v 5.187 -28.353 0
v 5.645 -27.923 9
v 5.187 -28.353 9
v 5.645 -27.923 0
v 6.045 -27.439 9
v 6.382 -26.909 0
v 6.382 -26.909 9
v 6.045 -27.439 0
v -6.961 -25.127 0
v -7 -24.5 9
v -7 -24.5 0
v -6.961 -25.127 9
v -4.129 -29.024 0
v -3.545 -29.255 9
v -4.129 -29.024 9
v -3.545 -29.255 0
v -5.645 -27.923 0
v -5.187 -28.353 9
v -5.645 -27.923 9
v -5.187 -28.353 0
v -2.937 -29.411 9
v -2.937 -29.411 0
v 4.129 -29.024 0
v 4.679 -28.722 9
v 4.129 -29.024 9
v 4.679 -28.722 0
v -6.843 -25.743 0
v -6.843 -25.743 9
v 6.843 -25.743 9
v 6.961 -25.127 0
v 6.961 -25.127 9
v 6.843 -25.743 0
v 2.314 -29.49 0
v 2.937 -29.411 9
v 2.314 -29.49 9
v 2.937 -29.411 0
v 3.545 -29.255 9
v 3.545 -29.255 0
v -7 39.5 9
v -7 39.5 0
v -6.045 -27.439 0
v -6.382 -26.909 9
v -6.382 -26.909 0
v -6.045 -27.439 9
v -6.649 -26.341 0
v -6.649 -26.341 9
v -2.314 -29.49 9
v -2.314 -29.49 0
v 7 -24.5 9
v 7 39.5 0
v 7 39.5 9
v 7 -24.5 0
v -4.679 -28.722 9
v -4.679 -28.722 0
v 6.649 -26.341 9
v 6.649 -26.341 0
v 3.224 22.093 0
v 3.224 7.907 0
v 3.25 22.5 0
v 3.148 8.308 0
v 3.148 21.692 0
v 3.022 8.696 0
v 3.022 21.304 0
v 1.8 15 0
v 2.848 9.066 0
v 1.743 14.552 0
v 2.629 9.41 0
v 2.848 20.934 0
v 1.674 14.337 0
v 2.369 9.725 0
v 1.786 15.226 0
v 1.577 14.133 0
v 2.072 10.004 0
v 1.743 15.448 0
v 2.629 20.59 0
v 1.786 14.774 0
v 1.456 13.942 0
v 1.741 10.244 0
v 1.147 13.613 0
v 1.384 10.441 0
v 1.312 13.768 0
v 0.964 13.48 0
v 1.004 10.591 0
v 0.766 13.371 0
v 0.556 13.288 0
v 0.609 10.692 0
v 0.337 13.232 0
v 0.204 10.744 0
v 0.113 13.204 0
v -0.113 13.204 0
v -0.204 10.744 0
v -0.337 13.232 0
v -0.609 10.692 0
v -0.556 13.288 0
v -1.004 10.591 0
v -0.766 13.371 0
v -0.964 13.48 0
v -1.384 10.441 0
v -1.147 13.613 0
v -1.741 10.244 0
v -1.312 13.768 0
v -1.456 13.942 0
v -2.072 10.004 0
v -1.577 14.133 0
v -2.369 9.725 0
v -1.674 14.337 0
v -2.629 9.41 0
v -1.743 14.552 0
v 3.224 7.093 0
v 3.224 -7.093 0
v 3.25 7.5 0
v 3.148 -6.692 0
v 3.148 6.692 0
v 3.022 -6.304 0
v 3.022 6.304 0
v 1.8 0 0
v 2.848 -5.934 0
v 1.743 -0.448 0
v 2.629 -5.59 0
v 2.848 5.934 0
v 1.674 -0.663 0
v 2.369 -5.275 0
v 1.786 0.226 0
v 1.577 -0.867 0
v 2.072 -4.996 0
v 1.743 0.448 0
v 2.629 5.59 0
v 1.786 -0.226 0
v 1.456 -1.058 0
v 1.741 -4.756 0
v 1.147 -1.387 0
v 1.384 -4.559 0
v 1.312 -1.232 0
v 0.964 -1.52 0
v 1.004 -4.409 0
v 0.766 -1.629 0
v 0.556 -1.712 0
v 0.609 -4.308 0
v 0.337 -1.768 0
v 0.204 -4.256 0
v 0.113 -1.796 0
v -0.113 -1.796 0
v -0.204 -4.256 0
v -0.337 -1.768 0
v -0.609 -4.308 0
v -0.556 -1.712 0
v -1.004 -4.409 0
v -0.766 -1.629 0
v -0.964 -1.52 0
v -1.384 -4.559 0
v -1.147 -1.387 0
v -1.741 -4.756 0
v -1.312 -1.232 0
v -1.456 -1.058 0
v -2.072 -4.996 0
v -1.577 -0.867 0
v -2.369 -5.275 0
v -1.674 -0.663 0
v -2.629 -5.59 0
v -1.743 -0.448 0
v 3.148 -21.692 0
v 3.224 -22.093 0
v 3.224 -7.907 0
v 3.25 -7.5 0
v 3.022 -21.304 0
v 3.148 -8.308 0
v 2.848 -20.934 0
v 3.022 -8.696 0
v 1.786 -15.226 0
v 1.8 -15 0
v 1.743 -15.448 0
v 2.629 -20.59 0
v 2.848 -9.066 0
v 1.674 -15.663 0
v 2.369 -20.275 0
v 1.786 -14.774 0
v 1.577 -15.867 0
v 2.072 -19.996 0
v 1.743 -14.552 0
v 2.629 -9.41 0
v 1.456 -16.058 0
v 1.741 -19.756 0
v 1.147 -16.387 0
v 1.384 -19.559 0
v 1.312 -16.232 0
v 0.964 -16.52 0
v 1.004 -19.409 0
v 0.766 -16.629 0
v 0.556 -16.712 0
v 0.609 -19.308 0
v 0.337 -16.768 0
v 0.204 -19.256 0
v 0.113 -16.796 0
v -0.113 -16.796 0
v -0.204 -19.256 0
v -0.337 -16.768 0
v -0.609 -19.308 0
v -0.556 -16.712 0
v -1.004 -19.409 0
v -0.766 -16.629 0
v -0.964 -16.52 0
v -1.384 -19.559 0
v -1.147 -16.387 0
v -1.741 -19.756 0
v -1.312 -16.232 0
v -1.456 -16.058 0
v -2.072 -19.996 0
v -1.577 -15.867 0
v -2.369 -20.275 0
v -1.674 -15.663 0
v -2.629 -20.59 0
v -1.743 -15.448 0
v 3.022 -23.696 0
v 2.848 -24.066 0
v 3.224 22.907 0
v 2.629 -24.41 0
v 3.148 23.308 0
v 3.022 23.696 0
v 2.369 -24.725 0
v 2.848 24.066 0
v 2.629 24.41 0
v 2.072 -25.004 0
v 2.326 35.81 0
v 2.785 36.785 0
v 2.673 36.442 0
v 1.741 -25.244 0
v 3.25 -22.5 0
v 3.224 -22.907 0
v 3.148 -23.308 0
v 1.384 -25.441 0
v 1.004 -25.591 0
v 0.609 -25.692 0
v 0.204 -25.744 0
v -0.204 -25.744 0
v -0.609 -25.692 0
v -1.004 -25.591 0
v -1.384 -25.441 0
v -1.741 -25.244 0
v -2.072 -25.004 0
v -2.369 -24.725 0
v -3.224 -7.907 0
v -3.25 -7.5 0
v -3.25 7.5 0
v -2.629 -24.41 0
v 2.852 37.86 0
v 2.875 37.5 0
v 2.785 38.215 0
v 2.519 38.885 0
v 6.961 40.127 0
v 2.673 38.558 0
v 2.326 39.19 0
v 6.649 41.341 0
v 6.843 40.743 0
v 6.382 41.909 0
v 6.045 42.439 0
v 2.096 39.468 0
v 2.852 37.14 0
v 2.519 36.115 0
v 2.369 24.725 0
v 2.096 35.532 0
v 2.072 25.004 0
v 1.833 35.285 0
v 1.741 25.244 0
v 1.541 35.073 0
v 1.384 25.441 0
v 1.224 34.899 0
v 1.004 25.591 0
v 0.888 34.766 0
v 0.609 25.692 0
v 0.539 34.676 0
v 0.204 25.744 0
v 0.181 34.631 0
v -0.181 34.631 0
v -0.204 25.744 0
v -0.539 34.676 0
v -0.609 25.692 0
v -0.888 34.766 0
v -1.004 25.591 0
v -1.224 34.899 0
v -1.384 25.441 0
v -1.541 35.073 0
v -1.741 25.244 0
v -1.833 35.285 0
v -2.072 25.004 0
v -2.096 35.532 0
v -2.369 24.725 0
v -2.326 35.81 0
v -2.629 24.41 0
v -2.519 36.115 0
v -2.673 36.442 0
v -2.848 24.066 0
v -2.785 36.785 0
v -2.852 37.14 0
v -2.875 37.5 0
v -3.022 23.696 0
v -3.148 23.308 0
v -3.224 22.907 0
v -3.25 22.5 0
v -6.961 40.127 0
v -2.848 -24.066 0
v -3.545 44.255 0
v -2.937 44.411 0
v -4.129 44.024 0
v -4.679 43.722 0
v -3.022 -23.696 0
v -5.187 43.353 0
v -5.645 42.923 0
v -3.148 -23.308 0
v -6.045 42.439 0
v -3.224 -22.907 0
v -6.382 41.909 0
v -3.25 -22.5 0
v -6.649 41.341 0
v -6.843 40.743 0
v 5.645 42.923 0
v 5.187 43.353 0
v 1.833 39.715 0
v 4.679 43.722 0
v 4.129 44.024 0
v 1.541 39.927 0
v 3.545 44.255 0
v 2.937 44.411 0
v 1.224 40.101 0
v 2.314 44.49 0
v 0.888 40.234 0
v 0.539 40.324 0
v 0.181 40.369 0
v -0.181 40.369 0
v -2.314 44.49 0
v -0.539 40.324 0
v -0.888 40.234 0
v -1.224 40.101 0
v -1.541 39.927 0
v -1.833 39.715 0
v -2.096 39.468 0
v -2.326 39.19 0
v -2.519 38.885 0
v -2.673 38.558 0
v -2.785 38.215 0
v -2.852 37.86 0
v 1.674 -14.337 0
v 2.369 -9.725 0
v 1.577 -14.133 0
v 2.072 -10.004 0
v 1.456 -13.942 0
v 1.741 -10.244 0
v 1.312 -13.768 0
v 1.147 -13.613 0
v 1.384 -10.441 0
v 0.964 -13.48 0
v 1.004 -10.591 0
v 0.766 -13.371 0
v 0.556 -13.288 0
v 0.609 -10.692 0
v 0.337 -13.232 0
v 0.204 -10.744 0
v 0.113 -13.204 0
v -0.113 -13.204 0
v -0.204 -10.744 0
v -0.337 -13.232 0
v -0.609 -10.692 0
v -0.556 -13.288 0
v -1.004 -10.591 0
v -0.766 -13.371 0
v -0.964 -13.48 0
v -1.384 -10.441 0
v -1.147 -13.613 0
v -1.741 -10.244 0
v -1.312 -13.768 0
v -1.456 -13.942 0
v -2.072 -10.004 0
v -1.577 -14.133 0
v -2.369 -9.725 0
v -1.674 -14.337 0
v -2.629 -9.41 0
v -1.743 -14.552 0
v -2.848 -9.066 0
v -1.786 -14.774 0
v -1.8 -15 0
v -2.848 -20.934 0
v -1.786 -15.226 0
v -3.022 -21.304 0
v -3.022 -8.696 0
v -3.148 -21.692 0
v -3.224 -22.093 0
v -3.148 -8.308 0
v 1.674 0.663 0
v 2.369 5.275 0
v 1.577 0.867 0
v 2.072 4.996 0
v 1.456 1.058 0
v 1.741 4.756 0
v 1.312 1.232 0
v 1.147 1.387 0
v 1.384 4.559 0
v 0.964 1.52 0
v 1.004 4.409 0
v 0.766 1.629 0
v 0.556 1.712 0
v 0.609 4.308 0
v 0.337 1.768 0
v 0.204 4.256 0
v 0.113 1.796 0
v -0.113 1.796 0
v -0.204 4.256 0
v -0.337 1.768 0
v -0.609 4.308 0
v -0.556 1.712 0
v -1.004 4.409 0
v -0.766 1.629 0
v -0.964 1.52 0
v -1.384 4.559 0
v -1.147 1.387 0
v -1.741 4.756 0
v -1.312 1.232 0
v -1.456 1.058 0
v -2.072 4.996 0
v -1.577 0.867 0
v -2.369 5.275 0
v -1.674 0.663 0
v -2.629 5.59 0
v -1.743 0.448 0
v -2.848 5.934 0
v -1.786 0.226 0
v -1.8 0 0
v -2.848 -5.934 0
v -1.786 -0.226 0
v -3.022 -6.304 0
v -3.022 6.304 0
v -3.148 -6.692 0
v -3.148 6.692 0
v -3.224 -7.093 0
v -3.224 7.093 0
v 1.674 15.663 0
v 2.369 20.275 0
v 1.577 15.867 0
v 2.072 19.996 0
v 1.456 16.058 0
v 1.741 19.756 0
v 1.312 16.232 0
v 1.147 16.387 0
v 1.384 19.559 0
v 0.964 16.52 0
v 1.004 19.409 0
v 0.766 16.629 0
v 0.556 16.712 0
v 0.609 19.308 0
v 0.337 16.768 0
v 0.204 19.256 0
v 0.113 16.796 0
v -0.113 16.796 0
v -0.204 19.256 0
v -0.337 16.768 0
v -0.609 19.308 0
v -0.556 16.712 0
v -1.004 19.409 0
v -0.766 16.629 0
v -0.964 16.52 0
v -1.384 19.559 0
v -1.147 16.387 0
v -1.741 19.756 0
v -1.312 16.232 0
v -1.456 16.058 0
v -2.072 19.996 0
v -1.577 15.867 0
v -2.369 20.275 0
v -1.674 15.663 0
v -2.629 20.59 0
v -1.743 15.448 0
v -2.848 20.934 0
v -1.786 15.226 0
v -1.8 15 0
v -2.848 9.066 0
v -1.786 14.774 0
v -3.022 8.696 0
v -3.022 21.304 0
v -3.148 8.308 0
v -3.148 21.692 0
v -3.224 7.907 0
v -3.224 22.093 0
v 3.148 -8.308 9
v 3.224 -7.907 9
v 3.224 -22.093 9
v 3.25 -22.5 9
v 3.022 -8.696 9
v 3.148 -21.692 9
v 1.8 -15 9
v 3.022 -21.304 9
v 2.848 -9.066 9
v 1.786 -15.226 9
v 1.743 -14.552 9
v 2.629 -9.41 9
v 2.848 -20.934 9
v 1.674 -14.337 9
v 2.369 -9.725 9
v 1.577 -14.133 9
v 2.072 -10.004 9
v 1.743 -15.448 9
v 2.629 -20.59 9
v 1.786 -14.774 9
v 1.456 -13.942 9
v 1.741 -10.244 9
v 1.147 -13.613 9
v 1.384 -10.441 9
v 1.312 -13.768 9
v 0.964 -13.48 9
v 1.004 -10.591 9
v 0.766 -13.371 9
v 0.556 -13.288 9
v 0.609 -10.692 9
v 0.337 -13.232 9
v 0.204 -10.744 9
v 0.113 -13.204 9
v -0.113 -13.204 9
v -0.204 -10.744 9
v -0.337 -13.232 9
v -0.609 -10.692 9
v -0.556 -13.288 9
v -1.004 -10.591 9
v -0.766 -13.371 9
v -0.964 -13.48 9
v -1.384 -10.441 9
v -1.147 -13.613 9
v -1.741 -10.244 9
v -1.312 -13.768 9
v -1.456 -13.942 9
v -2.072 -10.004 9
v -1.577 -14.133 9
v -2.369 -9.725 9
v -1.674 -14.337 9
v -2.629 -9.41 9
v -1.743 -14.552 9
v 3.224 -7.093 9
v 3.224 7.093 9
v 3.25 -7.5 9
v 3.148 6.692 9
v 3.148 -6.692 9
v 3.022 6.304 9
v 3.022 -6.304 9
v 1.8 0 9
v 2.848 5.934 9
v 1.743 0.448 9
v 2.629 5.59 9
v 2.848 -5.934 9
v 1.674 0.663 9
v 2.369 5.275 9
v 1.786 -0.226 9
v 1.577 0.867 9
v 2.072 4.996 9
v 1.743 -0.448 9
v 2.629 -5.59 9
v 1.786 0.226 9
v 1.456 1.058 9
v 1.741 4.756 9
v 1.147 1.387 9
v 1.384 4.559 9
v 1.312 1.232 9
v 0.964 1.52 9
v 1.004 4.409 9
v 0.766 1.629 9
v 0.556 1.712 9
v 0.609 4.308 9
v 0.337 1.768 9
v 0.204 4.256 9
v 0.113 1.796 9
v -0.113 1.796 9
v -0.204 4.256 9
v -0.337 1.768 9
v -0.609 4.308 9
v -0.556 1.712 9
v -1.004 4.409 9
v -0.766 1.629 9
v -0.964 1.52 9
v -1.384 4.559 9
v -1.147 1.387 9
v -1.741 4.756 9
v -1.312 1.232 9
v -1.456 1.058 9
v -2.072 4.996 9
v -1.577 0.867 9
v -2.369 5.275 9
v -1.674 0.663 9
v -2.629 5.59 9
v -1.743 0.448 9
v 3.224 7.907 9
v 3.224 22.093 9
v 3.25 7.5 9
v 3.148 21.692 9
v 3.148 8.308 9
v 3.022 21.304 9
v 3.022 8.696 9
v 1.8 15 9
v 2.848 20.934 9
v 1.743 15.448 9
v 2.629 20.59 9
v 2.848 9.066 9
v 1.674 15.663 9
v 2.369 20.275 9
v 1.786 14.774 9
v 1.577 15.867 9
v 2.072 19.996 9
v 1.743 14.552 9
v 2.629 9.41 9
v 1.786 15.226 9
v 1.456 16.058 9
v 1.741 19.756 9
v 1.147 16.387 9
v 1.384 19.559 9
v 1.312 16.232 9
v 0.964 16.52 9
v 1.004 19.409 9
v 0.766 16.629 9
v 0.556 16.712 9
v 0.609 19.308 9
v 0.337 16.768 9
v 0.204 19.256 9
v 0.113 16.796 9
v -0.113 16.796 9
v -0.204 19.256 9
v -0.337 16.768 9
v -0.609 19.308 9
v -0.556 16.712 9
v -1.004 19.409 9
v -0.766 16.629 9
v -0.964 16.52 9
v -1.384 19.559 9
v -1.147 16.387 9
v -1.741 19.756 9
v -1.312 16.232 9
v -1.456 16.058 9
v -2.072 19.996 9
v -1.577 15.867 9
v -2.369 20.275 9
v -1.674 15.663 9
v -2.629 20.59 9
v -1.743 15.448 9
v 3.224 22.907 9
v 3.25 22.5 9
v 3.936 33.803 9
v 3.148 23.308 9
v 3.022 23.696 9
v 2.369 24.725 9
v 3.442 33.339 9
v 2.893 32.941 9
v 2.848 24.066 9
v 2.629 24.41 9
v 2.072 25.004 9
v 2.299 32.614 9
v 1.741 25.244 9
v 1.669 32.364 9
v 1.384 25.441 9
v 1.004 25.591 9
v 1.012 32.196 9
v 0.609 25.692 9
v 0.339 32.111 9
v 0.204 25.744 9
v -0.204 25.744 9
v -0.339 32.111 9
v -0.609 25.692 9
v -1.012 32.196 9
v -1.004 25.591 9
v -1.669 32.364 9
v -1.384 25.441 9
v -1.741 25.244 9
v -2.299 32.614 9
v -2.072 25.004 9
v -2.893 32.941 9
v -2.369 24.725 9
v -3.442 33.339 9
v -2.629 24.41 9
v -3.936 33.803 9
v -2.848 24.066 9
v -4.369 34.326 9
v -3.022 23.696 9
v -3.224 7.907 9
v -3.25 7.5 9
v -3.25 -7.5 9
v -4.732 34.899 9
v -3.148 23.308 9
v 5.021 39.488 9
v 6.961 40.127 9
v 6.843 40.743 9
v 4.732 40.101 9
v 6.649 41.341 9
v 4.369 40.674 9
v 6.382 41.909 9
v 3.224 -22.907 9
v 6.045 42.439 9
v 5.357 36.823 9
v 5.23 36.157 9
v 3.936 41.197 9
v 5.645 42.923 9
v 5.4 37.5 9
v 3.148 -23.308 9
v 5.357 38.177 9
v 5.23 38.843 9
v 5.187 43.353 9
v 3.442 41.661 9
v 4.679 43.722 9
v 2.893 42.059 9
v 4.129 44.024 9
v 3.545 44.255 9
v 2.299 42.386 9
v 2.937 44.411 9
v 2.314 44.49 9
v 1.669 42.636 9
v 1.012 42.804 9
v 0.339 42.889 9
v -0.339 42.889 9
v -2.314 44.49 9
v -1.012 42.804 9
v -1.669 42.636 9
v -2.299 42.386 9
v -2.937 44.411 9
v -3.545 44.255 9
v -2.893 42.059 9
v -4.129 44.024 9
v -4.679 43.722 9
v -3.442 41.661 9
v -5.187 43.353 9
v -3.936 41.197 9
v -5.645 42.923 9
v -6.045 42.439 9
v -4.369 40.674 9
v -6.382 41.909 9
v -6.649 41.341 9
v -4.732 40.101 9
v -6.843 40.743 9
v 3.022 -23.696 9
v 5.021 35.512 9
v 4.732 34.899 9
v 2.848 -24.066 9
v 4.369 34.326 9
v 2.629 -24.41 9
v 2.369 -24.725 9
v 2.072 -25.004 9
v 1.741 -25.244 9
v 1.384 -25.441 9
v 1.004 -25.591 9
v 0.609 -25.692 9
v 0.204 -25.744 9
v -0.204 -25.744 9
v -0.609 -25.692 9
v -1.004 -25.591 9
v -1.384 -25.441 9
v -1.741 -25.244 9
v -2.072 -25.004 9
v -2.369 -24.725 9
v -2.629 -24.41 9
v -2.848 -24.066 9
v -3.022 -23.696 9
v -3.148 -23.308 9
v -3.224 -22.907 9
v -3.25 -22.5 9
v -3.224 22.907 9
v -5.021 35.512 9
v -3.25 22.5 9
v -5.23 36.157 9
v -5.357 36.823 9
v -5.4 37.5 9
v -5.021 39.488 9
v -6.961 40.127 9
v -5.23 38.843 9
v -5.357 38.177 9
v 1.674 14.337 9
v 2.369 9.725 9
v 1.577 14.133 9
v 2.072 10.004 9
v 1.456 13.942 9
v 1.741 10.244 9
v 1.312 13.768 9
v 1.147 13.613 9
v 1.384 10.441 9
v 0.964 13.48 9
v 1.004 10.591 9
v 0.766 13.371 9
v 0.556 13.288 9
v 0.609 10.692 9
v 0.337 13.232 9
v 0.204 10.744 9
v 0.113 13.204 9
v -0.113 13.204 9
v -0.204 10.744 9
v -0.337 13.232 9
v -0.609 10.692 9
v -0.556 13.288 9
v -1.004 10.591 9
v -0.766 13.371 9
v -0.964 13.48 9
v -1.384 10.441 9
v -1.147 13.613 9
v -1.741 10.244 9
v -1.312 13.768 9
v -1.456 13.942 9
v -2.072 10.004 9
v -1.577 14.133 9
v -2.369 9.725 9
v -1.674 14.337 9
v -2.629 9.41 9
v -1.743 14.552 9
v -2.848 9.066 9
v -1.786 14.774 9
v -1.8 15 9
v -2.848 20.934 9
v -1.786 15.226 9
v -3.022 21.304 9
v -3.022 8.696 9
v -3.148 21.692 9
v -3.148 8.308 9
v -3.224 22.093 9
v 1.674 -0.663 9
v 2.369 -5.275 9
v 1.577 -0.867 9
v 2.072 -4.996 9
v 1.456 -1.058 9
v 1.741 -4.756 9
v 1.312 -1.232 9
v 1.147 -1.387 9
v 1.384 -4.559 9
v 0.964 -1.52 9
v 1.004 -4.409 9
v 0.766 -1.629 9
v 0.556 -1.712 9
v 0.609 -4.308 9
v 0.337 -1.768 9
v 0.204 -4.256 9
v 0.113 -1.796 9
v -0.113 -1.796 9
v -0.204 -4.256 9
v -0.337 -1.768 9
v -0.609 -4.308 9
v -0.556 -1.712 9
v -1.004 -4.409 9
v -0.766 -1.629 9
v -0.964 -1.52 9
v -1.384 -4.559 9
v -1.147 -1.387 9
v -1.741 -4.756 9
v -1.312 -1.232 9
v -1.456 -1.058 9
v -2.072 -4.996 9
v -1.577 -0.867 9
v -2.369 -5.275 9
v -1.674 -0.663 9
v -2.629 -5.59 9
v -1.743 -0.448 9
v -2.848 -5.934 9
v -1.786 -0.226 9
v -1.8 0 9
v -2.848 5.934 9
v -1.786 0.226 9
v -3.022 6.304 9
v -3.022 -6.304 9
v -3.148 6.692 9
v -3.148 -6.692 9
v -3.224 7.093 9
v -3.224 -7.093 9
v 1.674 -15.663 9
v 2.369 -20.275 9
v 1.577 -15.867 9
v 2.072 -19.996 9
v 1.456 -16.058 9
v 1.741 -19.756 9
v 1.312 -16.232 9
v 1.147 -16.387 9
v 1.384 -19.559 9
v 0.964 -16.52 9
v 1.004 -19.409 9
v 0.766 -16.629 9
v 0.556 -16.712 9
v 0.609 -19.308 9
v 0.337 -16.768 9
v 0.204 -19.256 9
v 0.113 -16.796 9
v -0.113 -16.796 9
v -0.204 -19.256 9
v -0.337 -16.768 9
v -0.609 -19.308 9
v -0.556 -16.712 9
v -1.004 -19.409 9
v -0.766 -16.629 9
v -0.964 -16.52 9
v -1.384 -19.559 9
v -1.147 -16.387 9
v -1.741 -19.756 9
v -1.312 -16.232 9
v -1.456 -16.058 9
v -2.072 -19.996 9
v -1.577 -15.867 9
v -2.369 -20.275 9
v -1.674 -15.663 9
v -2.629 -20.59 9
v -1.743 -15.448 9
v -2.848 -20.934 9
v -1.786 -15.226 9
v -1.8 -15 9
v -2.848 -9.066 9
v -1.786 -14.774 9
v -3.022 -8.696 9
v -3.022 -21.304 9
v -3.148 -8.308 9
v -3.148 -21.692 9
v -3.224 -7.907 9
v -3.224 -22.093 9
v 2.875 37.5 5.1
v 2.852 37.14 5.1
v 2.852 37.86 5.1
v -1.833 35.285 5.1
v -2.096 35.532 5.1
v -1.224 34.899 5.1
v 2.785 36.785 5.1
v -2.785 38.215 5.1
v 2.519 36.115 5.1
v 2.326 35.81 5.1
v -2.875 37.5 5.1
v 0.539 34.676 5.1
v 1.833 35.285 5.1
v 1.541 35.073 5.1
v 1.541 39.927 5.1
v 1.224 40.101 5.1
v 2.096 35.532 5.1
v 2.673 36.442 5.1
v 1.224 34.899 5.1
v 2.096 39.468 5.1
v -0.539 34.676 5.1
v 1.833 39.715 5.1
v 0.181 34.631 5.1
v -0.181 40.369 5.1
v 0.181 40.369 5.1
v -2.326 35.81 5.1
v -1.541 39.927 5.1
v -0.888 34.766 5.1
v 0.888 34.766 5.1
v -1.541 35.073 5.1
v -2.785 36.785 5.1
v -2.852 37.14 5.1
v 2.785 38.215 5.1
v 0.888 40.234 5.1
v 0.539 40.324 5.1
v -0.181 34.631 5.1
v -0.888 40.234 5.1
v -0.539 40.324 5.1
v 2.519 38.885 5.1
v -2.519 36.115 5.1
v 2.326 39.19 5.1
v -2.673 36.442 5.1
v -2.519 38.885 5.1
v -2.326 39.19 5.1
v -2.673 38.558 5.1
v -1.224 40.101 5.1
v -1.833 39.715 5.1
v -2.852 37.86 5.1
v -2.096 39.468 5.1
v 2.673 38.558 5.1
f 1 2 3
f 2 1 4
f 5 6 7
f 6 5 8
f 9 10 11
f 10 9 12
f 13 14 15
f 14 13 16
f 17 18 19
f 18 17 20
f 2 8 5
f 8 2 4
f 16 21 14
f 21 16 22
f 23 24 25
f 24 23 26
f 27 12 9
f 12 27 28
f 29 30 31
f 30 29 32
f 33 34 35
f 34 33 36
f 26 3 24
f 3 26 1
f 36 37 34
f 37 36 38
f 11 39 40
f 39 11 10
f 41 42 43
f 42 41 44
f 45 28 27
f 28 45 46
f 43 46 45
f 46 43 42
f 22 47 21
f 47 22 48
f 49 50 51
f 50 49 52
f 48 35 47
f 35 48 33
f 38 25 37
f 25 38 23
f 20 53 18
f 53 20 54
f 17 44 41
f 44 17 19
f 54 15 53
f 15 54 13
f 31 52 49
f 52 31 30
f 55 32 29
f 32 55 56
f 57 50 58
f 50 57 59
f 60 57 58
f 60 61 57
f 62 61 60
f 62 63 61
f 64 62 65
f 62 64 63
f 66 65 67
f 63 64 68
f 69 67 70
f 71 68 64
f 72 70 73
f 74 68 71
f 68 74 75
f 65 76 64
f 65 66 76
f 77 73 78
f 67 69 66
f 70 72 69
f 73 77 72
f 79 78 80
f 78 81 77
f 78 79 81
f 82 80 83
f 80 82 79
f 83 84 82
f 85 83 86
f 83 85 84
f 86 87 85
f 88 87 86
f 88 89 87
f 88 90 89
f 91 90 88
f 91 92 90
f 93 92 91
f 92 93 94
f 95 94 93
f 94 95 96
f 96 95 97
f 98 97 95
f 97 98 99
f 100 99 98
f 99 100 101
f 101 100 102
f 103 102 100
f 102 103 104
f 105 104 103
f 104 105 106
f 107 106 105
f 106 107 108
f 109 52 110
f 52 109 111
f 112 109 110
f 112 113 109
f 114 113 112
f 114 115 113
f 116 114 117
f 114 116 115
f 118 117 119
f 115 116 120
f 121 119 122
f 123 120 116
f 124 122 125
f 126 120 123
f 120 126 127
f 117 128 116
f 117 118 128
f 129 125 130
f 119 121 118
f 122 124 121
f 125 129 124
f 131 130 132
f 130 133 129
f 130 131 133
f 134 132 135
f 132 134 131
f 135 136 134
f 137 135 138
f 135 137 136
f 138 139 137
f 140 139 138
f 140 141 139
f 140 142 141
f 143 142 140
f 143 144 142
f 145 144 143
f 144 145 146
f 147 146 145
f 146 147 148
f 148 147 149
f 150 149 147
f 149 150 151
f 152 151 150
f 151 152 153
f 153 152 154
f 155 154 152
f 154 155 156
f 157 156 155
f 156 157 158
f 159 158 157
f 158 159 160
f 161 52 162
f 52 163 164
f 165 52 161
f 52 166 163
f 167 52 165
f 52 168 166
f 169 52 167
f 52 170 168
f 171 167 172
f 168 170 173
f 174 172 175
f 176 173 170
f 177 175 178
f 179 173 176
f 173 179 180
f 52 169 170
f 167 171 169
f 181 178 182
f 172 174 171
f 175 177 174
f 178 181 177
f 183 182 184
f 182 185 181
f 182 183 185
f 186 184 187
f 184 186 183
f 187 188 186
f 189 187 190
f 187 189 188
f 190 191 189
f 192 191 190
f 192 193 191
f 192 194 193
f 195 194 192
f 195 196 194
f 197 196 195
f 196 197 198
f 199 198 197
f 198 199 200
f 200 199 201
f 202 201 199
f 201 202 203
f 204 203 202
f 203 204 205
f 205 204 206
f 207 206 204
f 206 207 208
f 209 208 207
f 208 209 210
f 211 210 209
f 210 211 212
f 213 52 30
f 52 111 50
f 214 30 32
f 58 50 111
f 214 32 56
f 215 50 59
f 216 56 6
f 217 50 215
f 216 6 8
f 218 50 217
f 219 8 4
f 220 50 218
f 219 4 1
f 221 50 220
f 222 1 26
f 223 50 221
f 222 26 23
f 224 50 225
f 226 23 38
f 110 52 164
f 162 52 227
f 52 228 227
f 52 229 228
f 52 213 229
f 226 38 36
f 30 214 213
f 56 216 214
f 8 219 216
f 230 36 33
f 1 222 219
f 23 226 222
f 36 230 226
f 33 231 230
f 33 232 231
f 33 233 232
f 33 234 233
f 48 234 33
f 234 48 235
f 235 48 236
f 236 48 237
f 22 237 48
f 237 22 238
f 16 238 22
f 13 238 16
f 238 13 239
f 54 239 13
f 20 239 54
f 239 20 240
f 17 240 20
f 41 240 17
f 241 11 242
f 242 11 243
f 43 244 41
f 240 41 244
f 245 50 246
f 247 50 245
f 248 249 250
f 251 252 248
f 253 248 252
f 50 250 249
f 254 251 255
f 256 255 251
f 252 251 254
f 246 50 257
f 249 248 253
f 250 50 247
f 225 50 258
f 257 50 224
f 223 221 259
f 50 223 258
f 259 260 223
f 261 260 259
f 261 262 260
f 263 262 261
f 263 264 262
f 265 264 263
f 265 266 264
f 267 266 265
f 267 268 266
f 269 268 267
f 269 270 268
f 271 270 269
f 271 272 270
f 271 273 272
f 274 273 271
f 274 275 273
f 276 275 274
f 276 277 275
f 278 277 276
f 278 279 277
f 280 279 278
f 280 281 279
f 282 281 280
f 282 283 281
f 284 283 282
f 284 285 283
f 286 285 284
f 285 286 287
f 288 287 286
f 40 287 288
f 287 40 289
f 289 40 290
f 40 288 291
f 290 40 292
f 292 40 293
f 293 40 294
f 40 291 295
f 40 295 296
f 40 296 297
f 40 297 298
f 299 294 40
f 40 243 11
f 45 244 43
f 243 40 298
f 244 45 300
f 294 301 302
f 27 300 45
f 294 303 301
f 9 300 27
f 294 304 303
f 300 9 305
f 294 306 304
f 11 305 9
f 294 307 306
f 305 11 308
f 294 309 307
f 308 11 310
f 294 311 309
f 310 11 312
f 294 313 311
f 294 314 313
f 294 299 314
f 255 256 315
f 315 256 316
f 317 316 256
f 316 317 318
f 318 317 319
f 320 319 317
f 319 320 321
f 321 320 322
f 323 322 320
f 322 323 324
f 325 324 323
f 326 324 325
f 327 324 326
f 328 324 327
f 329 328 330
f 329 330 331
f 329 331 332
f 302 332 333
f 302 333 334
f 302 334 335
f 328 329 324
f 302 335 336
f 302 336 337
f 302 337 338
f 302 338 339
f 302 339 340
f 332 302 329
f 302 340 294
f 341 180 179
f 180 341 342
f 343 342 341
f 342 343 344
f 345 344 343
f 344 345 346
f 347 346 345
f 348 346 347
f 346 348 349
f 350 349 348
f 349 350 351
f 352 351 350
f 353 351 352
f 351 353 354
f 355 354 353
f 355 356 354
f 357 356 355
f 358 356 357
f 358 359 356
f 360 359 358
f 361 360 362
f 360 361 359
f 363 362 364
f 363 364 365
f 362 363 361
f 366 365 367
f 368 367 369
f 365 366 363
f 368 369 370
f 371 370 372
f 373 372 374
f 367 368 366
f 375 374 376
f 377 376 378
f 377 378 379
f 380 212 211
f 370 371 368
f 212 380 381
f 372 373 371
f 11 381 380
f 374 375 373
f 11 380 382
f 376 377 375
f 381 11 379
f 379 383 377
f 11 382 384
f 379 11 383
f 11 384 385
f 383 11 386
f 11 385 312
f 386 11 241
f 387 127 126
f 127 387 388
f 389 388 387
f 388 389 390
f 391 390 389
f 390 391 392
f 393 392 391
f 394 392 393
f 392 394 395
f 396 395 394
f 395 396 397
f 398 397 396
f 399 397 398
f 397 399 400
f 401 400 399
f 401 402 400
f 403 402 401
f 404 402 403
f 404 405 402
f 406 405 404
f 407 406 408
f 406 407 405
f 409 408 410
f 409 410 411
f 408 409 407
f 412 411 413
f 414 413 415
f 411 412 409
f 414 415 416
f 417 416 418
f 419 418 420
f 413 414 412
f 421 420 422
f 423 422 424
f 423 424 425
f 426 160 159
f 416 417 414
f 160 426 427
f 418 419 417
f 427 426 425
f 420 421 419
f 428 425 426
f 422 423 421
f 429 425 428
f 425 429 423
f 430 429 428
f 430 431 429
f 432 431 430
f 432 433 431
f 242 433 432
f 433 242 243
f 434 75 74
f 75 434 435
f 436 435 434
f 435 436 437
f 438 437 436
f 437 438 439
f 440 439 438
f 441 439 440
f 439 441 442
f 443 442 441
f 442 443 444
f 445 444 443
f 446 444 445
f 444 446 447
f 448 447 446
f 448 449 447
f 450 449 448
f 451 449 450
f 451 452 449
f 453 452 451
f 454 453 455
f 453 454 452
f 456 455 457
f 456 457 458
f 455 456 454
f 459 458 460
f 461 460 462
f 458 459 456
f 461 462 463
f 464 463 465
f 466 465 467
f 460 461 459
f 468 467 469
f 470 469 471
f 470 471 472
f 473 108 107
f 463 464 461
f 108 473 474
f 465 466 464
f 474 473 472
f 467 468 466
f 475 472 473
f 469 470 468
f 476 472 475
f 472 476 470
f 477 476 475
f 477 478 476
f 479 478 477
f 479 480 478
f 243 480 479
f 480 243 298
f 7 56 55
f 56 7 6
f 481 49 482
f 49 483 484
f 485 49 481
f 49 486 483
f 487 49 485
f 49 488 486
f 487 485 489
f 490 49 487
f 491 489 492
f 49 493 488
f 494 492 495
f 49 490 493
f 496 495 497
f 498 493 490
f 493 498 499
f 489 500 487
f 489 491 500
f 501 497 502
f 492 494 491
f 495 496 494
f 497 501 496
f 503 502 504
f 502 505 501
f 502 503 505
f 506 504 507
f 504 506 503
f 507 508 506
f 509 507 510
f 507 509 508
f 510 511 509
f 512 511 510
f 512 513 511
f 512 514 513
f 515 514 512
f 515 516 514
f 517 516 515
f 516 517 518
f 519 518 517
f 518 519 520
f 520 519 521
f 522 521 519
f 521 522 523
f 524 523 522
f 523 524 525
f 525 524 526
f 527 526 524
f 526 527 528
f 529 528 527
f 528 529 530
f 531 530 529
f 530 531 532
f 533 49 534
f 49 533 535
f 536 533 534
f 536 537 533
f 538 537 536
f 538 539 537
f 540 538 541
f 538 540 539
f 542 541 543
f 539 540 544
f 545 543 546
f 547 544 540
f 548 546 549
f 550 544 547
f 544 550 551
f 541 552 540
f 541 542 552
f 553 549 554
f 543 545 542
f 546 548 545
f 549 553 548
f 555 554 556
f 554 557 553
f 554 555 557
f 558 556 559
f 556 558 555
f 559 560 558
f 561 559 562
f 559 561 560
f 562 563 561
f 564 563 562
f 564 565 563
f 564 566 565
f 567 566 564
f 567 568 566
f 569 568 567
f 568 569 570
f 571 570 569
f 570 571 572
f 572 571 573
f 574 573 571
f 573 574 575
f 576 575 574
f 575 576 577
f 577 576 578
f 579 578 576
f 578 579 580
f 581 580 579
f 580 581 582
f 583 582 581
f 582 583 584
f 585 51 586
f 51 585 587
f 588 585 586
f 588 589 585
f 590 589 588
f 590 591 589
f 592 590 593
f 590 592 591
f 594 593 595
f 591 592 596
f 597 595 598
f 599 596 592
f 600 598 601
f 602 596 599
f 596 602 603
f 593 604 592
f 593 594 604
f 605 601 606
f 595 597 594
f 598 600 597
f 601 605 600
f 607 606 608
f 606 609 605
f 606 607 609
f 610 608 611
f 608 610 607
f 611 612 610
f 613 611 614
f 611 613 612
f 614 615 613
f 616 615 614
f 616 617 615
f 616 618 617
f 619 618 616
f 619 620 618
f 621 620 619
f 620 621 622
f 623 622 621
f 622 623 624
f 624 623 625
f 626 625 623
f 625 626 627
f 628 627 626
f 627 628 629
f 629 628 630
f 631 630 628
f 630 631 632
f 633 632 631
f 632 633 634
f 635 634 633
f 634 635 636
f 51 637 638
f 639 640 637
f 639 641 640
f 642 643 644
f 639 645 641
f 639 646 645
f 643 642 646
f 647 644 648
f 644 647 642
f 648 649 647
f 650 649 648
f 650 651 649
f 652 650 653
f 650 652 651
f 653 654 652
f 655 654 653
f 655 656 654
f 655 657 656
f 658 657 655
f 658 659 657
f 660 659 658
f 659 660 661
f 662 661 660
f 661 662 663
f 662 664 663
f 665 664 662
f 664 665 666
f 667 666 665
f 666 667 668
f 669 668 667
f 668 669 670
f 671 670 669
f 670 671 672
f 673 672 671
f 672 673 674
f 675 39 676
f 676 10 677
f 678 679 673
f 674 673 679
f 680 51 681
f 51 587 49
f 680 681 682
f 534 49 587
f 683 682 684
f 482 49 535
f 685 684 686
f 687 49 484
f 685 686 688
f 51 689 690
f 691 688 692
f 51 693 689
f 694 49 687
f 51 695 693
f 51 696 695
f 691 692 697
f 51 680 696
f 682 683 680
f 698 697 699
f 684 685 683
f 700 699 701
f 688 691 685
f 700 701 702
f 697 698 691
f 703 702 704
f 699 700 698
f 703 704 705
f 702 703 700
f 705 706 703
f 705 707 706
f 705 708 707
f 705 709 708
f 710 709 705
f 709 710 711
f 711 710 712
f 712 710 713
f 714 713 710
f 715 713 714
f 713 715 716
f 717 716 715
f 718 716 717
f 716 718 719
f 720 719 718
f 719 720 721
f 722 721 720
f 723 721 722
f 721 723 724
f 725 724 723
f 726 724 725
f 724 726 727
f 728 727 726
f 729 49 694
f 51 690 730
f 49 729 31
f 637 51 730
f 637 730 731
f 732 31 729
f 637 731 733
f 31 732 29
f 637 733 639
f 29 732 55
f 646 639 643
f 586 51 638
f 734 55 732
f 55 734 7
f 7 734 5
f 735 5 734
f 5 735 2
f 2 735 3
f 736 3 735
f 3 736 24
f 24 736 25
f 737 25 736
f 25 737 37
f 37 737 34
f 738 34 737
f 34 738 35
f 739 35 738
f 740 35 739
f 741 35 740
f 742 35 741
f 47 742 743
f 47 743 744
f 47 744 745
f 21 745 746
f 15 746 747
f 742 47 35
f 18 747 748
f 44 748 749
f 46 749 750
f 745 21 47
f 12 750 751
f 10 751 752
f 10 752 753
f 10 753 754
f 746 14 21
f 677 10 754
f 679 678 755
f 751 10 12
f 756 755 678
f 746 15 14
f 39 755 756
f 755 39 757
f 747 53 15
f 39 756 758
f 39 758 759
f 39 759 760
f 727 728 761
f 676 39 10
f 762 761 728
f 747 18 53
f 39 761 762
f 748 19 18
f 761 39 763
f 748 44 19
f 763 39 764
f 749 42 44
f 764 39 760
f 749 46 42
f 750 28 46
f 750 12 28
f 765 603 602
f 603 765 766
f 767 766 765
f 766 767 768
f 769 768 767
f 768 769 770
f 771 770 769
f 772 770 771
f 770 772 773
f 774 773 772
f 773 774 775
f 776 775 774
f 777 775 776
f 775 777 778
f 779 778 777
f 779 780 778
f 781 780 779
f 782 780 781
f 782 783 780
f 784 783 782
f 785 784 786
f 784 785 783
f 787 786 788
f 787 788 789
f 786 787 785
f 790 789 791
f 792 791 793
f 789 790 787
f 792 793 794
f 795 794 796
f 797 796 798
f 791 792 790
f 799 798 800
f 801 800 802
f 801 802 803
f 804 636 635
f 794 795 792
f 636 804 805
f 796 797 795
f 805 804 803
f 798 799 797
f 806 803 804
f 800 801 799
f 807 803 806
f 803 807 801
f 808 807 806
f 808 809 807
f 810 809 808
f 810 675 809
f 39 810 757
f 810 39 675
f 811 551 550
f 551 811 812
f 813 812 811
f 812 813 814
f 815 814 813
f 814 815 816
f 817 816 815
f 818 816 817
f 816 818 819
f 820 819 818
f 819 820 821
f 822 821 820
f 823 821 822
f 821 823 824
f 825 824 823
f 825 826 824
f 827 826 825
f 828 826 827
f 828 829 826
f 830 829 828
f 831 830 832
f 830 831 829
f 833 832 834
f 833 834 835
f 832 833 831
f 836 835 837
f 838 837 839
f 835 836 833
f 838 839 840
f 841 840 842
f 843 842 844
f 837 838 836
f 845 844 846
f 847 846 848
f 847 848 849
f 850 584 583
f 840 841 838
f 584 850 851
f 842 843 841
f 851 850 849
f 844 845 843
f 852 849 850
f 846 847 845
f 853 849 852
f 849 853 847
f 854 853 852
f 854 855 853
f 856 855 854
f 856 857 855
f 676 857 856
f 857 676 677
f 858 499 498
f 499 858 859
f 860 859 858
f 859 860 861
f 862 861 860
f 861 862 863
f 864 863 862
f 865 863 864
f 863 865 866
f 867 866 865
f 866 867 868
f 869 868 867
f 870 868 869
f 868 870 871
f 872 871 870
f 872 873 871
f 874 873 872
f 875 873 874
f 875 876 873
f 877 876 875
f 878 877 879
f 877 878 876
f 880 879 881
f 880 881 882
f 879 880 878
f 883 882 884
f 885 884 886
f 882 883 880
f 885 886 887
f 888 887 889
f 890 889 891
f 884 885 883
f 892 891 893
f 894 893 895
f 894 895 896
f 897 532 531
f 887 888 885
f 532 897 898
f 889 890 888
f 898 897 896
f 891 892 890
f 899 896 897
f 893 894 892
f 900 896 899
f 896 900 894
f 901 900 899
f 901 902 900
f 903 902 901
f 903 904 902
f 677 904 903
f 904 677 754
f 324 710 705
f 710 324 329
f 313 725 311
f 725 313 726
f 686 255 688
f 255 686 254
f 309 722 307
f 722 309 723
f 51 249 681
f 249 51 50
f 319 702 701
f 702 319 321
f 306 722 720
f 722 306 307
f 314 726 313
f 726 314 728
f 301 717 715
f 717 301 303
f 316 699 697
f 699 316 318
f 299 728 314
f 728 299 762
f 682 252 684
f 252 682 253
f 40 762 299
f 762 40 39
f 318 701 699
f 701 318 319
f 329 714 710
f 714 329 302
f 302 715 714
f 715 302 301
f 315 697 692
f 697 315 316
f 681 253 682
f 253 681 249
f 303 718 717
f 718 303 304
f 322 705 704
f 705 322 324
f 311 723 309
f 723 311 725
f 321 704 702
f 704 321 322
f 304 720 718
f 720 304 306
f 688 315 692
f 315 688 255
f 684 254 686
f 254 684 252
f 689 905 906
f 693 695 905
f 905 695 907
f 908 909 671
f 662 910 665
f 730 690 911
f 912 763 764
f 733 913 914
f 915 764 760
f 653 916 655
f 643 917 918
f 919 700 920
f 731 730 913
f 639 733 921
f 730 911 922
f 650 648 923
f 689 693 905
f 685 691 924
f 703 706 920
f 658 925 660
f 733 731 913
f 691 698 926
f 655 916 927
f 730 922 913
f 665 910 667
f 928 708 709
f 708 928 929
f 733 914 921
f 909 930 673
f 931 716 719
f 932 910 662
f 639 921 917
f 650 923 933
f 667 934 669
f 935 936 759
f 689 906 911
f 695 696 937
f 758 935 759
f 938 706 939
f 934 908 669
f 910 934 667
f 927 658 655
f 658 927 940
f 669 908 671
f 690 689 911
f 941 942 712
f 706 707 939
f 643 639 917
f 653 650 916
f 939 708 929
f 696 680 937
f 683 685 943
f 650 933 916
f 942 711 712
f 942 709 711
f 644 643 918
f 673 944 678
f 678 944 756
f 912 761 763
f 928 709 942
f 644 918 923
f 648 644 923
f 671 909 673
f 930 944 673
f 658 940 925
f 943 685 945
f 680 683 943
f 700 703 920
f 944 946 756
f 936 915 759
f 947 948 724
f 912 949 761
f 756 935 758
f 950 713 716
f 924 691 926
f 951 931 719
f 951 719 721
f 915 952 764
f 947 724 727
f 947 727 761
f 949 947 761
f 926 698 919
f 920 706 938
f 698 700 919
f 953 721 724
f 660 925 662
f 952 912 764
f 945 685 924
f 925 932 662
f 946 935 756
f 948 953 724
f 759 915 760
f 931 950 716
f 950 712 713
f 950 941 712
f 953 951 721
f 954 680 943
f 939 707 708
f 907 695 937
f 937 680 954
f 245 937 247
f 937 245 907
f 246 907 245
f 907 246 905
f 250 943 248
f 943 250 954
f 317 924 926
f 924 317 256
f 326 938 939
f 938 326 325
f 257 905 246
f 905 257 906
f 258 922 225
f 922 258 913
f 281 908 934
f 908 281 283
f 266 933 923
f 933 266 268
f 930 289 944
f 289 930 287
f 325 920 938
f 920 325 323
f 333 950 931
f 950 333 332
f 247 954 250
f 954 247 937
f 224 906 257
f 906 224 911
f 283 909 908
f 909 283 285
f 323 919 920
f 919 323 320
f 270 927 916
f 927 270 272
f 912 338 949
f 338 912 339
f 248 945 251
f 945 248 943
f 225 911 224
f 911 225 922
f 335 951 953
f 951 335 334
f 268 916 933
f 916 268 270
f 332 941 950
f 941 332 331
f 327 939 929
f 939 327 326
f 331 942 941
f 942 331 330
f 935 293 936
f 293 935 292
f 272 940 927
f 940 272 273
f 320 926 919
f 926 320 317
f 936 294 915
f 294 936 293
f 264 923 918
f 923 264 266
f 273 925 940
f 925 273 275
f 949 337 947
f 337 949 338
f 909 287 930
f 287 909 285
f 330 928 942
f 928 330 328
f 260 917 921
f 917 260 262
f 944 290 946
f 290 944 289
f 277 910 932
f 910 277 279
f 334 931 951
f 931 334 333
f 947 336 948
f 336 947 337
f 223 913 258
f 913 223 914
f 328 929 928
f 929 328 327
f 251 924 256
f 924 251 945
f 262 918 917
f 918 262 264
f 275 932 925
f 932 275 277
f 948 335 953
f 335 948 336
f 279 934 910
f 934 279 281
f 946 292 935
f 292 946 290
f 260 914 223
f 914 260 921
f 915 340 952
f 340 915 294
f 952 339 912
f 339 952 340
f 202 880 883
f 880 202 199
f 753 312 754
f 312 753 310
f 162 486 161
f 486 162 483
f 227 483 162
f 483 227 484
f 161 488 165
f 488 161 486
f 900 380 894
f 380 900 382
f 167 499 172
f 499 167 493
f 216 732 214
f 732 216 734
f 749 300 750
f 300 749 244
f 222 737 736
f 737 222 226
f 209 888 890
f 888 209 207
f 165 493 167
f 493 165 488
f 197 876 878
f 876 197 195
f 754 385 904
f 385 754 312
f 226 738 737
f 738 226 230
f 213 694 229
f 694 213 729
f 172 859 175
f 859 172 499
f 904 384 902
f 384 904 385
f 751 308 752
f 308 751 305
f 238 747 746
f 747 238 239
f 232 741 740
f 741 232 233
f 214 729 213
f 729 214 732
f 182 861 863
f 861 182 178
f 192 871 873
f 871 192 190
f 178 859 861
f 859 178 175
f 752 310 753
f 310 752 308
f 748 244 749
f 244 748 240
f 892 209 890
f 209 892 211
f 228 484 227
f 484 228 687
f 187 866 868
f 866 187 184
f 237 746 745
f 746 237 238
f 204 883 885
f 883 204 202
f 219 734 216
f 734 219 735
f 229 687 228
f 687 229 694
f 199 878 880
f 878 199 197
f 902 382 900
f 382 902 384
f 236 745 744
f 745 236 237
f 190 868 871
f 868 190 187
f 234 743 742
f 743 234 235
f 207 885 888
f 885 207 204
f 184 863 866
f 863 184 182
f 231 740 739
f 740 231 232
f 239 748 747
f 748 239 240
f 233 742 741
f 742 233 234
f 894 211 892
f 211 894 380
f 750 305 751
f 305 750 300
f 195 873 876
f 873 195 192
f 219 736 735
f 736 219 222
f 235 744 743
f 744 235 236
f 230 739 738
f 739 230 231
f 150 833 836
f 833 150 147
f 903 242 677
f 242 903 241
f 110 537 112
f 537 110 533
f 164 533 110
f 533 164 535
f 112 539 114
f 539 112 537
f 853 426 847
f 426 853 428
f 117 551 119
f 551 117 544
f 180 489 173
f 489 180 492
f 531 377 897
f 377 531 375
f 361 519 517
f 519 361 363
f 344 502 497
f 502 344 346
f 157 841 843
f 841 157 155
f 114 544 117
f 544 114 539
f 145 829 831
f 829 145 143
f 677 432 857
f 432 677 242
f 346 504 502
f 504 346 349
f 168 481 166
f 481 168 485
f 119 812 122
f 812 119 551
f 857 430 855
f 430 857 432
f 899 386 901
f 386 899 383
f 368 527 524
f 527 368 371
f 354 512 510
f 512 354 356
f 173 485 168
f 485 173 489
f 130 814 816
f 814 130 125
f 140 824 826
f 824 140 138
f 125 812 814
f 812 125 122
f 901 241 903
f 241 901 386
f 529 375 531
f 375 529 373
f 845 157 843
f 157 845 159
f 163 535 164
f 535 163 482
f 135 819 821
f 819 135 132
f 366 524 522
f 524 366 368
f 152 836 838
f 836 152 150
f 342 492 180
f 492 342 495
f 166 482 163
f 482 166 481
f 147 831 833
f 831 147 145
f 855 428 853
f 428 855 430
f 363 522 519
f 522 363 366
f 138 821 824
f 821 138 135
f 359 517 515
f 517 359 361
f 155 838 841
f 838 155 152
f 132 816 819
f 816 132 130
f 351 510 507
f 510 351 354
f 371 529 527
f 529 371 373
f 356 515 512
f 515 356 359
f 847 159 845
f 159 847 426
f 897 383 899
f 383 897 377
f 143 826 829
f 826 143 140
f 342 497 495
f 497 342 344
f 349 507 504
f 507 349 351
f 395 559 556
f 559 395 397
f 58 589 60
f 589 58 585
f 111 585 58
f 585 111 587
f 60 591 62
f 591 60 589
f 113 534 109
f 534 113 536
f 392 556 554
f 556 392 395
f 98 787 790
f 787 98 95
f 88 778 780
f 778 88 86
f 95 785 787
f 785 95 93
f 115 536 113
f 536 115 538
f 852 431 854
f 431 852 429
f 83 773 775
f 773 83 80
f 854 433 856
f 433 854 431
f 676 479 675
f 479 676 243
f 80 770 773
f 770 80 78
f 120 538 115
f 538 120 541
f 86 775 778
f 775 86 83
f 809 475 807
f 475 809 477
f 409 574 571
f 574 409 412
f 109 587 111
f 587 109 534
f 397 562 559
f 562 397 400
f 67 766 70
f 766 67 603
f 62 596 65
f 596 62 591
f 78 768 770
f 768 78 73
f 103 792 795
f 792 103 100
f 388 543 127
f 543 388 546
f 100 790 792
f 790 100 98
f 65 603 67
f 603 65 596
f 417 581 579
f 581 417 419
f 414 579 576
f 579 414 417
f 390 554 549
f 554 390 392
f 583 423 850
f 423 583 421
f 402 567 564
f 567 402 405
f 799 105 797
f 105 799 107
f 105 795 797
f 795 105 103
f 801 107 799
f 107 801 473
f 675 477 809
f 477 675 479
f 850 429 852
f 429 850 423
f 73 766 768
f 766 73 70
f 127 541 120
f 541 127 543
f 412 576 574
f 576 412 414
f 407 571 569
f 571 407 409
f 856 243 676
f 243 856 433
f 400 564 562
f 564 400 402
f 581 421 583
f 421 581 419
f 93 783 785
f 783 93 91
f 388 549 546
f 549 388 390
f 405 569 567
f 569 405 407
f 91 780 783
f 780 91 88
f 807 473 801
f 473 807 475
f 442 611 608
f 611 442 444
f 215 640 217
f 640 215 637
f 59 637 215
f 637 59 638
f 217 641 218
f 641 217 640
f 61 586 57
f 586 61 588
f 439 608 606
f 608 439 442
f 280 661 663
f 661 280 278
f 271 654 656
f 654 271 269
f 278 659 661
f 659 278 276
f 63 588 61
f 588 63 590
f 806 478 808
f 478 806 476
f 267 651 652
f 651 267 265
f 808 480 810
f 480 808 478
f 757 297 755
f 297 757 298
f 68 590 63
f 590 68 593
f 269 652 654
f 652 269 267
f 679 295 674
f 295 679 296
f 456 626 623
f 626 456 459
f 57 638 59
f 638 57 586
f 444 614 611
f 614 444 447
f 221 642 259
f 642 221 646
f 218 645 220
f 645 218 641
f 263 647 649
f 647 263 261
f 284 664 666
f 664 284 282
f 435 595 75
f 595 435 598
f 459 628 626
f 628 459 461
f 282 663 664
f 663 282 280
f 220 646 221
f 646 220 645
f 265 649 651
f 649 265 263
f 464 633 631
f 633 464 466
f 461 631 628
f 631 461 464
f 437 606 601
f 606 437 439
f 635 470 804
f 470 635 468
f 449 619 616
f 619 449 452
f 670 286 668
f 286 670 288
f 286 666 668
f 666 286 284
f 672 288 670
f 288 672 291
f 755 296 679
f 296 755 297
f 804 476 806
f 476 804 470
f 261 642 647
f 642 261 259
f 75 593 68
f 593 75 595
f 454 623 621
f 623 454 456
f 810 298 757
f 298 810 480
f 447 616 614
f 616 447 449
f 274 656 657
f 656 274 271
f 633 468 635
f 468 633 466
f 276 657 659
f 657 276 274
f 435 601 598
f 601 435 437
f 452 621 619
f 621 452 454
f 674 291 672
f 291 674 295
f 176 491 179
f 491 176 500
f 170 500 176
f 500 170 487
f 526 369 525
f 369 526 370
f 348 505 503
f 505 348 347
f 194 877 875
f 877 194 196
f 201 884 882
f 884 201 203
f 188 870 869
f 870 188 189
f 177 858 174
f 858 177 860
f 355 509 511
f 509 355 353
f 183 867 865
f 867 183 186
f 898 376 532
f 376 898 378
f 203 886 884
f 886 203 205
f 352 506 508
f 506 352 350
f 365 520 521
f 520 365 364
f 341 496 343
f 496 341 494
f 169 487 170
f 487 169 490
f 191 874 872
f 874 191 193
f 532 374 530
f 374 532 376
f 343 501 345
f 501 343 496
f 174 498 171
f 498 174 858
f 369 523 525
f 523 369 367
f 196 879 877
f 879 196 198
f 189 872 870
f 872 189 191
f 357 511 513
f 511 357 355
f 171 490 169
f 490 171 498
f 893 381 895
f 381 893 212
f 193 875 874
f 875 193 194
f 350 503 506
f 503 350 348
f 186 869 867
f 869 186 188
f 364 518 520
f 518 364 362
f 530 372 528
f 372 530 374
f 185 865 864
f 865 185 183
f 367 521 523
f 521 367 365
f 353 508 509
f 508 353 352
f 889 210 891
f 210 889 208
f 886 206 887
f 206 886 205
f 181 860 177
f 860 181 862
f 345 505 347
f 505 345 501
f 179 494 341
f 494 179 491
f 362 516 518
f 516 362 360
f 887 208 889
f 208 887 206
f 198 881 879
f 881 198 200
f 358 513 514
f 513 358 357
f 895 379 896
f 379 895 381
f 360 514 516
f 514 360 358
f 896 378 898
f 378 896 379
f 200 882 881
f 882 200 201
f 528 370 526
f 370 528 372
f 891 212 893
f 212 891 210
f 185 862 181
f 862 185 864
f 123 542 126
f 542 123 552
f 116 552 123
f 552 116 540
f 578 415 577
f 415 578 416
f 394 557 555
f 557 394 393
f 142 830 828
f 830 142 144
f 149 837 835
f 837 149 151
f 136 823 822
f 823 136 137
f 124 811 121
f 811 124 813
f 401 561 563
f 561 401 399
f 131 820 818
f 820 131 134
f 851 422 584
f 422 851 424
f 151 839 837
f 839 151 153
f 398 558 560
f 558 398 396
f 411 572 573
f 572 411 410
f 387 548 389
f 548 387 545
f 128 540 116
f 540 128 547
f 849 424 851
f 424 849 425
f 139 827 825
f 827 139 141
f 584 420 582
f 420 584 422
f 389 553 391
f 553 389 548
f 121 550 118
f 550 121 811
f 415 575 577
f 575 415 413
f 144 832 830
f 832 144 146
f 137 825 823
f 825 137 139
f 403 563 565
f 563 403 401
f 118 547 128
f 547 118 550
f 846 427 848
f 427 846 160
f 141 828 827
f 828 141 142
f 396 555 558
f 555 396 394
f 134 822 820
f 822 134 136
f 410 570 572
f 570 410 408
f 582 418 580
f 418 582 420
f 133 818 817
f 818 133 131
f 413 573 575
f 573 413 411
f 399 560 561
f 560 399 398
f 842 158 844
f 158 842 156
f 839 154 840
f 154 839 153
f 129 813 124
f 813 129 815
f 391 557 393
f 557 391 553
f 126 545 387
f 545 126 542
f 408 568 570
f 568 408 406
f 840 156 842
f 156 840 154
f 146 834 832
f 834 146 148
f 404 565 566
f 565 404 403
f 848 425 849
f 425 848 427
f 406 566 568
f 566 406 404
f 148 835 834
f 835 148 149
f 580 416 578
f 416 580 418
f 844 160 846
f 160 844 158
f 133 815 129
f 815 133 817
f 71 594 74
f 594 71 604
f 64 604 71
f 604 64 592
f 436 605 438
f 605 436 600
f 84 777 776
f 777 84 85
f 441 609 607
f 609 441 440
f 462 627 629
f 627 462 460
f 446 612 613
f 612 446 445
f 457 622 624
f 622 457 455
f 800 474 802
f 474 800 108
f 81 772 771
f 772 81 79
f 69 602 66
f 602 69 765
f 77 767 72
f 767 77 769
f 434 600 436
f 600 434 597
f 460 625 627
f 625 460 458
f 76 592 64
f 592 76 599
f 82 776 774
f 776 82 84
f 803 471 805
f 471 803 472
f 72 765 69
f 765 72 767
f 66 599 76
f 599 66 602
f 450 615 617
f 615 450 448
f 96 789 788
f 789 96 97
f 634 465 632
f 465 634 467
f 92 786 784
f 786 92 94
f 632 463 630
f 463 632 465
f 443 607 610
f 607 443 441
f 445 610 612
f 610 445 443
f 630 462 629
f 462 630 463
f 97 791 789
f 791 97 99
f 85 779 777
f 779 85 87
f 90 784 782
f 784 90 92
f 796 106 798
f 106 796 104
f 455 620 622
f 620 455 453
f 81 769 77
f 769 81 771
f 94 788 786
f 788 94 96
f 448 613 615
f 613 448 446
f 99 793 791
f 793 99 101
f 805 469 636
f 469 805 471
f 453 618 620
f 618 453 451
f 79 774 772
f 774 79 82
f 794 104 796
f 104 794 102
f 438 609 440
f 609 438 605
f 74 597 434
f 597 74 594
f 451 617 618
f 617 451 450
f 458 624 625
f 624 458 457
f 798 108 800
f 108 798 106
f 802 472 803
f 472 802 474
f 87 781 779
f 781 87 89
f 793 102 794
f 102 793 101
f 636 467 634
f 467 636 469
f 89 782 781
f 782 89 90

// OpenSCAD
$fn = 50;


difference() {
	union() {
		hull() {
			translate(v = [-2.0000000000, 24.5000000000, 0]) {
				cylinder(h = 9, r = 5);
			}
			translate(v = [2.0000000000, 24.5000000000, 0]) {
				cylinder(h = 9, r = 5);
			}
			translate(v = [-2.0000000000, -24.5000000000, 0]) {
				cylinder(h = 9, r = 5);
			}
			translate(v = [2.0000000000, -24.5000000000, 0]) {
				cylinder(h = 9, r = 5);
			}
		}
		translate(v = [0.0000000000, 30.0000000000, 0]) {
			hull() {
				translate(v = [-2.0000000000, 9.5000000000, 0]) {
					cylinder(h = 9, r = 5);
				}
				translate(v = [2.0000000000, 9.5000000000, 0]) {
					cylinder(h = 9, r = 5);
				}
				translate(v = [-2.0000000000, -9.5000000000, 0]) {
					cylinder(h = 9, r = 5);
				}
				translate(v = [2.0000000000, -9.5000000000, 0]) {
					cylinder(h = 9, r = 5);
				}
			}
		}
		translate(v = [0.0000000000, 30.0000000000, 0]) {
			hull() {
				translate(v = [-2.0000000000, 9.5000000000, 0]) {
					cylinder(h = 9, r = 5);
				}
				translate(v = [2.0000000000, 9.5000000000, 0]) {
					cylinder(h = 9, r = 5);
				}
				translate(v = [-2.0000000000, -9.5000000000, 0]) {
					cylinder(h = 9, r = 5);
				}
				translate(v = [2.0000000000, -9.5000000000, 0]) {
					cylinder(h = 9, r = 5);
				}
			}
		}
	}
	union() {
		translate(v = [0.0000000000, 37.5000000000, 9]) {
			rotate(a = [0, 0, 0]) {
				difference() {
					union() {
						#translate(v = [0, 0, -9.0000000000]) {
							cylinder(h = 9, r = 2.6000000000);
						}
						#translate(v = [0, 0, -3.9000000000]) {
							cylinder(h = 3.9000000000, r1 = 2.8750000000, r2 = 5.4000000000);
						}
						#translate(v = [0, 0, -9.0000000000]) {
							cylinder(h = 9, r = 2.8750000000);
						}
						#translate(v = [0, 0, -9.0000000000]) {
							cylinder(h = 9, r = 2.6000000000);
						}
					}
					union();
				}
			}
		}
		translate(v = [0.0000000000, 37.5000000000, 9]) {
			rotate(a = [0, 0, 0]) {
				difference() {
					union() {
						#translate(v = [0, 0, -9.0000000000]) {
							cylinder(h = 9, r = 2.6000000000);
						}
						#translate(v = [0, 0, -3.9000000000]) {
							cylinder(h = 3.9000000000, r1 = 2.8750000000, r2 = 5.4000000000);
						}
						#translate(v = [0, 0, -9.0000000000]) {
							cylinder(h = 9, r = 2.8750000000);
						}
						#translate(v = [0, 0, -9.0000000000]) {
							cylinder(h = 9, r = 2.6000000000);
						}
					}
					union();
				}
			}
		}
		translate(v = [0.0000000000, -22.5000000000, 0]) {
			translate(v = [0, 0, -100]) {
				cylinder(h = 200, r = 3.2500000000);
			}
		}
		translate(v = [0.0000000000, -7.5000000000, 0]) {
			translate(v = [0, 0, -100]) {
				cylinder(h = 200, r = 3.2500000000);
			}
		}
		translate(v = [0.0000000000, 7.5000000000, 0]) {
			translate(v = [0, 0, -100]) {
				cylinder(h = 200, r = 3.2500000000);
			}
		}
		translate(v = [0.0000000000, 22.5000000000, 0]) {
			translate(v = [0, 0, -100]) {
				cylinder(h = 200, r = 3.2500000000);
			}
		}
		translate(v = [0.0000000000, -22.5000000000, 0]) {
			translate(v = [0, 0, -100]) {
				cylinder(h = 200, r = 1.8000000000);
			}
		}
		translate(v = [0.0000000000, -15.0000000000, 0]) {
			translate(v = [0, 0, -100]) {
				cylinder(h = 200, r = 1.8000000000);
			}
		}
		translate(v = [0.0000000000, -7.5000000000, 0]) {
			translate(v = [0, 0, -100]) {
				cylinder(h = 200, r = 1.8000000000);
			}
		}
		translate(v = [0, 0, -100]) {
			cylinder(h = 200, r = 1.8000000000);
		}
		translate(v = [0.0000000000, 7.5000000000, 0]) {
			translate(v = [0, 0, -100]) {
				cylinder(h = 200, r = 1.8000000000);
			}
		}
		translate(v = [0.0000000000, 15.0000000000, 0]) {
			translate(v = [0, 0, -100]) {
				cylinder(h = 200, r = 1.8000000000);
			}
		}
		translate(v = [0.0000000000, 22.5000000000, 0]) {
			translate(v = [0, 0, -100]) {
				cylinder(h = 200, r = 1.8000000000);
			}
		}
	}
}
